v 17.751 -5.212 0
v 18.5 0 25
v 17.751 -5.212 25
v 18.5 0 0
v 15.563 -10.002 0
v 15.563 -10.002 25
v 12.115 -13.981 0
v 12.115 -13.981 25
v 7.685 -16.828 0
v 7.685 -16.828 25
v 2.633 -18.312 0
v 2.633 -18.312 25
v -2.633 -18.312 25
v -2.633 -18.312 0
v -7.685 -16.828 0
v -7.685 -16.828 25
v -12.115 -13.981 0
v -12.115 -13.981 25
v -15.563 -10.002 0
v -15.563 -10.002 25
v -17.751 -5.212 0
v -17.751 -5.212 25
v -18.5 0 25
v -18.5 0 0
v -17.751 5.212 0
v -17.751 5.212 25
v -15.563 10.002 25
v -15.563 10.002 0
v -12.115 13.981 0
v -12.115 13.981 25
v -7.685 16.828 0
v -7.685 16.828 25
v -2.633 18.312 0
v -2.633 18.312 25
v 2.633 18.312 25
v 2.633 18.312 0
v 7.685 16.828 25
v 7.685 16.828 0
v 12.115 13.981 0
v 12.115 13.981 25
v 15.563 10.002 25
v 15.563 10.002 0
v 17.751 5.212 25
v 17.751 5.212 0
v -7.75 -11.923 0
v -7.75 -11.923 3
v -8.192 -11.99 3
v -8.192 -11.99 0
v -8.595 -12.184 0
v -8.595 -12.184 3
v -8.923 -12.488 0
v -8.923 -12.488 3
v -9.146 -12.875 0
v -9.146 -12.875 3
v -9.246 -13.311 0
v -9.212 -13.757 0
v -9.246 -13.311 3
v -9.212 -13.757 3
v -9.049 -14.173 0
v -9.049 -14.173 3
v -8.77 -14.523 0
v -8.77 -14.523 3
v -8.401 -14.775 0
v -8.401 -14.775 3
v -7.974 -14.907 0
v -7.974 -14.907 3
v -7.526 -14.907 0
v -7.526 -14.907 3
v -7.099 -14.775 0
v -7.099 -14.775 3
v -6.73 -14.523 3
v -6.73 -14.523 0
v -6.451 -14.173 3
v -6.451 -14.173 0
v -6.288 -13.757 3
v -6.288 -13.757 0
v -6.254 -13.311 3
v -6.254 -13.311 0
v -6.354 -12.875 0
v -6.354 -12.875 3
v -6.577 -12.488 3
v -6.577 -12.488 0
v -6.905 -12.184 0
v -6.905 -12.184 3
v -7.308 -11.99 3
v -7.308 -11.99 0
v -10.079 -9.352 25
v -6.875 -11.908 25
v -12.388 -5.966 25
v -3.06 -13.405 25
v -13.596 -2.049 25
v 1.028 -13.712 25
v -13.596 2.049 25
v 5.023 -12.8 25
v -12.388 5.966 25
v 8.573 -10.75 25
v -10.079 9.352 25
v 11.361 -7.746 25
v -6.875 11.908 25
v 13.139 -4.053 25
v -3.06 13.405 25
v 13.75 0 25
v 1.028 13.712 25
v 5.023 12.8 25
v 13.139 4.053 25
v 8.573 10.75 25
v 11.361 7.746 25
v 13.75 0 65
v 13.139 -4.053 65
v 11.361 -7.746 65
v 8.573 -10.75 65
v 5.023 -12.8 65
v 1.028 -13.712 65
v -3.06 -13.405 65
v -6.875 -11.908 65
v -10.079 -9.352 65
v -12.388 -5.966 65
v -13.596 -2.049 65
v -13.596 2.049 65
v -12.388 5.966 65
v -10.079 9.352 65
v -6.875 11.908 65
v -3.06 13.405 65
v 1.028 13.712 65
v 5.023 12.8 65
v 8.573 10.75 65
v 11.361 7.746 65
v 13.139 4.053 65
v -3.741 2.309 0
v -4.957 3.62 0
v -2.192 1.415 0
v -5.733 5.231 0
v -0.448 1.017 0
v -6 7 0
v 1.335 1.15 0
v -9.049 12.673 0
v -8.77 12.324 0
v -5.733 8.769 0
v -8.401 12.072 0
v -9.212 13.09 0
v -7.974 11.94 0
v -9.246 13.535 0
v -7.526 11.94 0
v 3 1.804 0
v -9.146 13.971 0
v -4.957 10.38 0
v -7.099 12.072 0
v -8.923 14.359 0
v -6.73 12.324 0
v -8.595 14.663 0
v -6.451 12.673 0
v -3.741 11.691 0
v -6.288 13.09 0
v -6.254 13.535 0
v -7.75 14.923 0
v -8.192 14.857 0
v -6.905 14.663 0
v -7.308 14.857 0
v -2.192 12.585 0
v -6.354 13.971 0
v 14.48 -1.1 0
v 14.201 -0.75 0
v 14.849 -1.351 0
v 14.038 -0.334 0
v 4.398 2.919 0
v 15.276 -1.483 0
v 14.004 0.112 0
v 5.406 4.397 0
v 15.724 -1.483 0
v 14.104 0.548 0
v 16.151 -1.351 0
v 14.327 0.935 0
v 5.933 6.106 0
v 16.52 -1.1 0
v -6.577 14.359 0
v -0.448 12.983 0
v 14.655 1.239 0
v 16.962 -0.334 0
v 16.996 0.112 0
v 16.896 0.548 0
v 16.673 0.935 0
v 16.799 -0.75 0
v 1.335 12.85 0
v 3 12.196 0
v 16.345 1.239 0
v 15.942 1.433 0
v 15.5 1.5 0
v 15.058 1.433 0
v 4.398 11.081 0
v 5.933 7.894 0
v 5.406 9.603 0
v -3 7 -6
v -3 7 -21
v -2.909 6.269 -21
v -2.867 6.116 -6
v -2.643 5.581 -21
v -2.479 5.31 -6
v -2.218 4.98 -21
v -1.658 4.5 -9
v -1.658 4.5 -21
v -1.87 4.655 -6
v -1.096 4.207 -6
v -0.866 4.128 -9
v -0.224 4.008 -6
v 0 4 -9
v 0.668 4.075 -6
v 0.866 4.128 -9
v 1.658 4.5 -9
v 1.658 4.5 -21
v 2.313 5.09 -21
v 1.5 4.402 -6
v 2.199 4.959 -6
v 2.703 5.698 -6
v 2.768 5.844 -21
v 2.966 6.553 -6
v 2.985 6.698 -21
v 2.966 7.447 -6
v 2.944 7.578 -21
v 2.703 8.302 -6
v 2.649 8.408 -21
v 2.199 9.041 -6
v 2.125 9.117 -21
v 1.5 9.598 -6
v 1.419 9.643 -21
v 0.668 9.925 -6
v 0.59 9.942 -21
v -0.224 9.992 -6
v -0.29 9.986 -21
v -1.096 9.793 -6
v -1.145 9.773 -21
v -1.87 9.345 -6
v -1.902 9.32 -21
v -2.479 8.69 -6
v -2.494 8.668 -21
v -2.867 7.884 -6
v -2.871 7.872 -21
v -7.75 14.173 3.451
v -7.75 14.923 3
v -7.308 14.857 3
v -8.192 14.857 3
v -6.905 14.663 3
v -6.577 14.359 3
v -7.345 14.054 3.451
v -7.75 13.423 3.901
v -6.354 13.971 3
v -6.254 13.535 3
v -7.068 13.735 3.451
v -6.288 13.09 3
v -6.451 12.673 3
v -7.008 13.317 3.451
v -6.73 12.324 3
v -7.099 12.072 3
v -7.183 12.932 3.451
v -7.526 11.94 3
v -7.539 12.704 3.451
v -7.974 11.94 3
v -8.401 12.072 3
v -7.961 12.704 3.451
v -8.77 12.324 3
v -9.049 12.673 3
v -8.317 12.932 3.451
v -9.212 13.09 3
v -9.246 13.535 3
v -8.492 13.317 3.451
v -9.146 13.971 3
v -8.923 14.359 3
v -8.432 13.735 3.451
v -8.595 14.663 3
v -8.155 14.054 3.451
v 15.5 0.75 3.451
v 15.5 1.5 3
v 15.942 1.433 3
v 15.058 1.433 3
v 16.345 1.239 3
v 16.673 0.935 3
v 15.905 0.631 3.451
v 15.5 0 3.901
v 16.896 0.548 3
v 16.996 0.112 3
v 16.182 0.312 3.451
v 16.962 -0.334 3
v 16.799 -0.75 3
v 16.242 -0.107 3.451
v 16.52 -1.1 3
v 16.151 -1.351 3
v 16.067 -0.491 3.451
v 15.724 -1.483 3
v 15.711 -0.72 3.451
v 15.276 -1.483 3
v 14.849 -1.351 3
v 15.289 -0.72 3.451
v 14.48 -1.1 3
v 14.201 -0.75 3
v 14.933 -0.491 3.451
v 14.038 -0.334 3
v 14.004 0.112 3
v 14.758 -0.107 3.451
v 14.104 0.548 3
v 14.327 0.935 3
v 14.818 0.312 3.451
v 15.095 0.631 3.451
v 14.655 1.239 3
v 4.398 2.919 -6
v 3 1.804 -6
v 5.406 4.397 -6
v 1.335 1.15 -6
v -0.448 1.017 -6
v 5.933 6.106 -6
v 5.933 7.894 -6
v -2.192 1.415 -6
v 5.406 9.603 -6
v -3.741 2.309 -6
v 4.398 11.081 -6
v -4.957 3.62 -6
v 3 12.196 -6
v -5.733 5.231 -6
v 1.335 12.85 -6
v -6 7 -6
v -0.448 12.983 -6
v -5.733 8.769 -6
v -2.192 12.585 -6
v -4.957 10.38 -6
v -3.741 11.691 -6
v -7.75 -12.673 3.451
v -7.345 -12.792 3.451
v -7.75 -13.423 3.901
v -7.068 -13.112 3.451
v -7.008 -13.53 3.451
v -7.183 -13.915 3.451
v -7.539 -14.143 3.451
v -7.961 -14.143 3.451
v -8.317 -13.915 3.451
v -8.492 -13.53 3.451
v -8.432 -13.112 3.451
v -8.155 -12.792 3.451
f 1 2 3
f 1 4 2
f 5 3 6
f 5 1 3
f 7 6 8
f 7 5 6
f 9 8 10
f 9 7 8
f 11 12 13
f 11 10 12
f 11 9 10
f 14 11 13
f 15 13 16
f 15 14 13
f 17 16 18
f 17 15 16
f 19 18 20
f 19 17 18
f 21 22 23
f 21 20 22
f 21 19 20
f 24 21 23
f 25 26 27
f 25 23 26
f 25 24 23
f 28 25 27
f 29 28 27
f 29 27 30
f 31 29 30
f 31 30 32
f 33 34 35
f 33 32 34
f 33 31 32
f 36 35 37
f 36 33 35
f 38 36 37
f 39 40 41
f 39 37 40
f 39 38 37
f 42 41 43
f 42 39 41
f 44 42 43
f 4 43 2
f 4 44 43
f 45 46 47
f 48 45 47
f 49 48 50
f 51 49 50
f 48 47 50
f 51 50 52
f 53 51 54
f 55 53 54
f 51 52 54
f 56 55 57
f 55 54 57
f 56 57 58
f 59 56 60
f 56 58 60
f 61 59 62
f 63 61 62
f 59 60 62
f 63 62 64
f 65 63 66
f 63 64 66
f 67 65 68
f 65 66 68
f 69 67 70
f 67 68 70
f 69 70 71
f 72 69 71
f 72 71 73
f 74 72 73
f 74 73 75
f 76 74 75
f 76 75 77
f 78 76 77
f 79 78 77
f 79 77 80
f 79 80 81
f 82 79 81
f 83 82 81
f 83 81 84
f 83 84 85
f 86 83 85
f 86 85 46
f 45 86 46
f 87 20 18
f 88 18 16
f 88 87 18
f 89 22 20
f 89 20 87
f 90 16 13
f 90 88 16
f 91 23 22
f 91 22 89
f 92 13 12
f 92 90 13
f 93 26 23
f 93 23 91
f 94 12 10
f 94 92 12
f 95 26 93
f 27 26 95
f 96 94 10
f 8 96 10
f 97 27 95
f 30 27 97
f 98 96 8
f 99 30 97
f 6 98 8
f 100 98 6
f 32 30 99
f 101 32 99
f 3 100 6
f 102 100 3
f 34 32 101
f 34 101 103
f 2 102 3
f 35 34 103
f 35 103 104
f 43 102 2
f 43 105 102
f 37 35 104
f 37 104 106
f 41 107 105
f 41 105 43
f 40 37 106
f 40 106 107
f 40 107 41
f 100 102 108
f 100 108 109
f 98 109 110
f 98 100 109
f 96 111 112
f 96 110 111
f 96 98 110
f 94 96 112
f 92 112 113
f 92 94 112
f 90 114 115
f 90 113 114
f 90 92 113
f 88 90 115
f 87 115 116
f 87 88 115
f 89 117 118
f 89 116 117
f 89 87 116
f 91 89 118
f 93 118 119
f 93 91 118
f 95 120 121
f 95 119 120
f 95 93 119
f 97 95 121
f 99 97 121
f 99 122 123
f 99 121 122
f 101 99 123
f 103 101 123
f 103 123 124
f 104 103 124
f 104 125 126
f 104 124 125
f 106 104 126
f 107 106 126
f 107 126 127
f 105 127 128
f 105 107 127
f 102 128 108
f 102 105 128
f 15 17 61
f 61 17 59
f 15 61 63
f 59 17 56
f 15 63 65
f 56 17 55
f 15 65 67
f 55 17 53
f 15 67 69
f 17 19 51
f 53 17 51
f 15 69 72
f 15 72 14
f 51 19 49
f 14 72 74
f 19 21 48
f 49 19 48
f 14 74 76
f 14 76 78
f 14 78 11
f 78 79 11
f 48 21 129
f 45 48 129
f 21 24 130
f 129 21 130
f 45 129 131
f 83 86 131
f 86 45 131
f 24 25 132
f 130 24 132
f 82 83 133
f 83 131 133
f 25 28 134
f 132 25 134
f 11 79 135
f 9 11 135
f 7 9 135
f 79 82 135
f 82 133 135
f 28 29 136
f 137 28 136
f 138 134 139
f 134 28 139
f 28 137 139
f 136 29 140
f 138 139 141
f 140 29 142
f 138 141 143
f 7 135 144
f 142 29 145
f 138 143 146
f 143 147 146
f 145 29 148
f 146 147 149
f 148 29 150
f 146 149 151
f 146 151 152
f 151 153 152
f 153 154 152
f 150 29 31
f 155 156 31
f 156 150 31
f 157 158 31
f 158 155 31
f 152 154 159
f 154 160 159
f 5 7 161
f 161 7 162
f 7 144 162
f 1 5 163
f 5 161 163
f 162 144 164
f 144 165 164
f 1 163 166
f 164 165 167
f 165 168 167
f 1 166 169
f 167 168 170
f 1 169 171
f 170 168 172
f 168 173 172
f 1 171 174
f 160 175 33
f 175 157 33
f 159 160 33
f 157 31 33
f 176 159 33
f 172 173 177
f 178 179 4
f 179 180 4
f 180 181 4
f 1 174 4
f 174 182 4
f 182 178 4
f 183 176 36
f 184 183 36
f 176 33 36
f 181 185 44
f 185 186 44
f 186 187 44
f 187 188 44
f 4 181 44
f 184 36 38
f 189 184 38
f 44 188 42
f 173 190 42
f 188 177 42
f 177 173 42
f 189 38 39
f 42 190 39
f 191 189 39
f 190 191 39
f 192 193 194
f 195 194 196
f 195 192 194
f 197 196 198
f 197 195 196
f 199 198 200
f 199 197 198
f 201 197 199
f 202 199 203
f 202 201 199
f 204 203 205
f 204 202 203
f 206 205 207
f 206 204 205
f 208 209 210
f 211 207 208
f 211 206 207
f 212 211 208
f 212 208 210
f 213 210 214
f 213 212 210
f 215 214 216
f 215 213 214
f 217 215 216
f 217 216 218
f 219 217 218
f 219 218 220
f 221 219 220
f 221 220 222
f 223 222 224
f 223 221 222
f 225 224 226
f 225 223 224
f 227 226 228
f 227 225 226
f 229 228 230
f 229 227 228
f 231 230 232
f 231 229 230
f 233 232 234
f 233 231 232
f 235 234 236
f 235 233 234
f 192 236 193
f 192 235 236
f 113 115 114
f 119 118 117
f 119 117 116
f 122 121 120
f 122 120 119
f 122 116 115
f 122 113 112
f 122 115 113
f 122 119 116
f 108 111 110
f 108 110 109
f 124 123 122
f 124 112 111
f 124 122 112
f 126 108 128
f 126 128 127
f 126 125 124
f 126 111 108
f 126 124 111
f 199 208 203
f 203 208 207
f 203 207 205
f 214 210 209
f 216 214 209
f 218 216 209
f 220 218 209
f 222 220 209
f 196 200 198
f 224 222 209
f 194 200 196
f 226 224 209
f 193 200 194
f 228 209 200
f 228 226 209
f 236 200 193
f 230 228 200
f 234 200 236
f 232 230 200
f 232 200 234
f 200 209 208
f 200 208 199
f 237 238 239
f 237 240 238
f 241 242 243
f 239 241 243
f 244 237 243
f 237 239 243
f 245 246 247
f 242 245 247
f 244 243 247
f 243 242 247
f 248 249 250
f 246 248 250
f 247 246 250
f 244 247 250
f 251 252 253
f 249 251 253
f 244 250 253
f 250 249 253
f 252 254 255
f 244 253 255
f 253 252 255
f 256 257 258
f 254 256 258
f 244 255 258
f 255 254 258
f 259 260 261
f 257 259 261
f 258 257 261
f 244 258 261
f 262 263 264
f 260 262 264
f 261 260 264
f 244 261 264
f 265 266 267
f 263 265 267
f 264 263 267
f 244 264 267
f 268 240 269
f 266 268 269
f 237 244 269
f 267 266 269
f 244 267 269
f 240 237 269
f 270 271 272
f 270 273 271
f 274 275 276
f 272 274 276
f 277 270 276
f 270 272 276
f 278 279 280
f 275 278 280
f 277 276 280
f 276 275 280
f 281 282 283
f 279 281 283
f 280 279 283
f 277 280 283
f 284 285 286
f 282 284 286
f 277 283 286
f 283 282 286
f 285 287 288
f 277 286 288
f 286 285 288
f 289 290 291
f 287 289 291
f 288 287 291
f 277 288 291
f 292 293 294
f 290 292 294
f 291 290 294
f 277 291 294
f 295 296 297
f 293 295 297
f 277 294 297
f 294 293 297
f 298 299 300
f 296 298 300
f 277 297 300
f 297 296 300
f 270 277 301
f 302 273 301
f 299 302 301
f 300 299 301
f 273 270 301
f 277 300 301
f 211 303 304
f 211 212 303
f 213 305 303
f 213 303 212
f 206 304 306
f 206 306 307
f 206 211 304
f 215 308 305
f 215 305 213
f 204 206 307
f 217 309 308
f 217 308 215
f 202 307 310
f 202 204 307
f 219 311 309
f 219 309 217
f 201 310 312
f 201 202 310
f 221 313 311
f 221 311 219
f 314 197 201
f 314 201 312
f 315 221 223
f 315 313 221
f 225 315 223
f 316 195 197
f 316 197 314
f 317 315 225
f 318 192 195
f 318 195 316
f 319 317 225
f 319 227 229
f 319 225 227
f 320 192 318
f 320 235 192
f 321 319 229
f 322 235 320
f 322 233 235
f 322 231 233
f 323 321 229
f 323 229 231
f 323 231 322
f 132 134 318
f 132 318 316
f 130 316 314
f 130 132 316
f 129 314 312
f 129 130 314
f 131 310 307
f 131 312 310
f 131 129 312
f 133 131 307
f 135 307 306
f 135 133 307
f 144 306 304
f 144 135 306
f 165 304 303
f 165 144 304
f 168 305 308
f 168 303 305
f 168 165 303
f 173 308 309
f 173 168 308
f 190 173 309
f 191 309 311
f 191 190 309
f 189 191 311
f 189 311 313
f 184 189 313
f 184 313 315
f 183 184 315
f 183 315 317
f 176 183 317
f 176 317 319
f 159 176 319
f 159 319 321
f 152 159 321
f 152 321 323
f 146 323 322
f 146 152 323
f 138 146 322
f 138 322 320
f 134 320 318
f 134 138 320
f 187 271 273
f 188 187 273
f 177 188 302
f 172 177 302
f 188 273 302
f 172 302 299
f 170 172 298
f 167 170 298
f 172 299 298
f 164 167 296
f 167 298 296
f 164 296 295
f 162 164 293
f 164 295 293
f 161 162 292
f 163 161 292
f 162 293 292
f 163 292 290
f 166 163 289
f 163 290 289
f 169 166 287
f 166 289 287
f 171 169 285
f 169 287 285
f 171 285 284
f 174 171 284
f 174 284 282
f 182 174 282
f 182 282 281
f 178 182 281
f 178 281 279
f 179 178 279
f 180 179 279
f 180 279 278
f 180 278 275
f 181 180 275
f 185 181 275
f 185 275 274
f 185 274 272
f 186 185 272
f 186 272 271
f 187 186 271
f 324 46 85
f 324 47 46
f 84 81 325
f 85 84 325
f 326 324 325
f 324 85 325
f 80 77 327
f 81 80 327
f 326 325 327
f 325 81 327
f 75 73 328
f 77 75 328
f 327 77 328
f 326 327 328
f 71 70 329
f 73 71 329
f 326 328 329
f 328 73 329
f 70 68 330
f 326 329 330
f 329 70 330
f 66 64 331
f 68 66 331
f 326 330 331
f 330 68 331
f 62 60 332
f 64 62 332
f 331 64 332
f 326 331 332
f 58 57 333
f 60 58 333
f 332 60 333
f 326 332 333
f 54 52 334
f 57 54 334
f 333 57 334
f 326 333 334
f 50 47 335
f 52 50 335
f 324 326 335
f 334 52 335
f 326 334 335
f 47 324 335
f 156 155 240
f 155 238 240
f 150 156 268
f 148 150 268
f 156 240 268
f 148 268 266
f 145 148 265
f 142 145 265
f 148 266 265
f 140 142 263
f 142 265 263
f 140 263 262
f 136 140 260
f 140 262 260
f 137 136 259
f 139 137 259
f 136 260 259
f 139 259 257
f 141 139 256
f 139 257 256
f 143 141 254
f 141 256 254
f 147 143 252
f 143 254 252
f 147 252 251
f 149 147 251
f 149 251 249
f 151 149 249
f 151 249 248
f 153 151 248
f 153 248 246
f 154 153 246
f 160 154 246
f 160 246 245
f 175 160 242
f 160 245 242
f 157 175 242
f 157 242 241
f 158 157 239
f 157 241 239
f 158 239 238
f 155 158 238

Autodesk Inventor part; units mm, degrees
ref_plane "YZ Plane" through (0, 0, 0) normal (1, 0, 0) x (0, 1, 0)
ref_plane "XZ Plane" through (0, 0, 0) normal (0, 1, 0) x (-1, 0, 0)
sketch "スケッチ1" plane through (0, 0, 0) normal (0, 0, 1) x (1, 0, 0)
  circle A0 centre (0, 0) radius 18.5
  dimension "d0" = 37
extrude "押し出し1" add sketch "スケッチ1" along normal blind 25
sketch "スケッチ2" plane through (0, 0, 25) normal (0, 0, 1) x (1, 0, 0)
  circle A0 centre (0, 0) radius 13.75
  dimension "d3" = 27.5
extrude "押し出し2" add sketch "スケッチ2" along normal blind 40
sketch "スケッチ3" plane through (0, 0, 0) normal (0, 0, -1) x (-1, 0, 0)
  circle A0 centre (0, 0) radius 18.5 projected
  circle A1 centre (0, 7) radius 6
  dimension "d6" = 12
  dimension "d7" = 7
extrude "押し出し3" add sketch "スケッチ3" along normal blind 6 contours A1
sketch "スケッチ4" plane through (0, 7, -6) normal (0, 0, -1) x (-1, 0, 0)
  circle A0 centre (0, 0) radius 3
  point P0 (0, -7)
  dimension "d10" = 6
extrude "押し出し4" add sketch "スケッチ4" along normal blind 15
sketch "スケッチ5" plane through (0, 0, 0) normal (0, 0, -1) x (-1, 0, 0)
  circle A0 centre (0, 0) radius 18.5 projected
  circle A1 centre (0, 0) radius 15.5
  line L0 (0, 0) -> (-15.5, 0)
  line L1 (7.75, 13.4234) -> (0, 0)
  line L2 (0, 0) -> (7.75, -13.4234)
  point P0 (-15.5, 0)
  point P1 (7.75, -13.4234)
  dimension "d13" = 31
  dimension "d14" = 120
  dimension "d15" = 120
hole "Hole1" at (15.5, 0, 0) at (-7.75, -13.4234, 0) at (-7.75, 13.4234, 0) direction (0, 0, 1) diameter 3 depth 3 tip angle 118
ref_plane "作業平面1" through (0, 0, 0) normal (1, 0, 0) x (0, 0.3162, -0.9487)
sketch "スケッチ6" plane through (0, 7, -21) normal (0, 0, -1) x (-1, 0, 0)
  arc A0 (-1.6583, -2.5) -> (1.6583, -2.5) centre (0, 0) ccw
  circle A1 centre (0, 0) radius 3 projected
  line L0 (-1.6583, -2.5) -> (1.6583, -2.5)
  line L1 (0, 0) -> (-3, 0)
  point P0 (0, -7)
  dimension "d23" = 2.5
extrude "押し出し5" cut sketch "スケッチ6" against normal blind 12 contours L0 A0
properties part number "rs380ph_36"
